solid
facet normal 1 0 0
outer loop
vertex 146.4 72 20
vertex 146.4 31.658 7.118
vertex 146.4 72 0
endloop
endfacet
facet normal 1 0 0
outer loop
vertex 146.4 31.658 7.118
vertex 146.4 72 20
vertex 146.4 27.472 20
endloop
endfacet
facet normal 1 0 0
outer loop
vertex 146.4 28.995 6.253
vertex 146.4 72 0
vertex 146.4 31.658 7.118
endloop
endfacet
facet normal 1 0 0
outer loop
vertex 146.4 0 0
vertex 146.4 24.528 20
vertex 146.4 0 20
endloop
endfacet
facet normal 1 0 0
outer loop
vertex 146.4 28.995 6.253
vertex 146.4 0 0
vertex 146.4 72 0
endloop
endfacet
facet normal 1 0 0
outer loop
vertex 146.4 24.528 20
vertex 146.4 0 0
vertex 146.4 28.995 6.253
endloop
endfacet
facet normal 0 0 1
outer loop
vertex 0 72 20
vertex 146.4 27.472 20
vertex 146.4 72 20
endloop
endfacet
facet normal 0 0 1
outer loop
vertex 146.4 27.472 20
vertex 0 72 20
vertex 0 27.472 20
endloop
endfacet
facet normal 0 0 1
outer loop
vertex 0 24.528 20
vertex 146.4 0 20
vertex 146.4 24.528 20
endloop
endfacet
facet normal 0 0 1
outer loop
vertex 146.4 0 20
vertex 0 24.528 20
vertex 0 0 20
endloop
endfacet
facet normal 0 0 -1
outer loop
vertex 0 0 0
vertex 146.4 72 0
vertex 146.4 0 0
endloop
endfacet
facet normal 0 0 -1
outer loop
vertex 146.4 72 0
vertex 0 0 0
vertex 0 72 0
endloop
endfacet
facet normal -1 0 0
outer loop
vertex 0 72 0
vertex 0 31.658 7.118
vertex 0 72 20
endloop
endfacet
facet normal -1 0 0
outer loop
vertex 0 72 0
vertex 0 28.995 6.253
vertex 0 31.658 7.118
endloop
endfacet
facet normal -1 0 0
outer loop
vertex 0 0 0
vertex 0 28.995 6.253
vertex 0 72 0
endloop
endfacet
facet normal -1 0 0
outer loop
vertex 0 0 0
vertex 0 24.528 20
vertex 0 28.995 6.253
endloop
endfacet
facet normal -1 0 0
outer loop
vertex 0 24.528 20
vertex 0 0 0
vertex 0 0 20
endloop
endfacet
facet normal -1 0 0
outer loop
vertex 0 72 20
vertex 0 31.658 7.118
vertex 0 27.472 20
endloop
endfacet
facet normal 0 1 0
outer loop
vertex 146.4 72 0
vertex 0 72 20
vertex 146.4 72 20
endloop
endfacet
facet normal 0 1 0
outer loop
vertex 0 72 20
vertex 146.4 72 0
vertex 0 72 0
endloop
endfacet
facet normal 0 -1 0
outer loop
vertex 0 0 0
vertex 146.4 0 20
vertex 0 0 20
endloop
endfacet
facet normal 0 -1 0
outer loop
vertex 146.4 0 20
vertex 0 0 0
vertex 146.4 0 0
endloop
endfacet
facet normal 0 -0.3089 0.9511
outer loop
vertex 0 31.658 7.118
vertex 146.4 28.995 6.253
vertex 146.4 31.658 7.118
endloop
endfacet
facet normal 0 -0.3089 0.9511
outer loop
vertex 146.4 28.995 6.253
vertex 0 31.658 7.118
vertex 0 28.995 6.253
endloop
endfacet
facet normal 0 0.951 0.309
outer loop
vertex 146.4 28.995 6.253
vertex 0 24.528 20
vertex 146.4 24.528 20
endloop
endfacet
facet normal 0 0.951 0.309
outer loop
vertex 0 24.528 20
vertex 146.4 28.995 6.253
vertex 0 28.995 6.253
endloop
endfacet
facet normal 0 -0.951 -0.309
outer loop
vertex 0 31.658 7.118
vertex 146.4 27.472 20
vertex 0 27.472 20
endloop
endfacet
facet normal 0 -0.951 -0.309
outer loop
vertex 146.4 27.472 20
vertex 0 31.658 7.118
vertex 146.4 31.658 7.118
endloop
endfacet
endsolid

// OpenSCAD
// file: qr_data.scad
// AUTO-GENERATED by tools/qrgen.py — DO NOT EDIT BY HAND.
// Regenerate: tools/qrgen.py --out donation-qr-stand/qr_data.scad --error q venmo=https://venmo.com/u/IamMrCupp cashapp=https://cash.app/$IamMrCupp
// QR error-correction level: Q. 1 = dark, row 0 = top.

// venmo: https://venmo.com/u/IamMrCupp  (29x29)
venmo_qr = [
  [1,1,1,1,1,1,1,0,0,0,0,1,0,1,1,0,1,1,0,0,0,0,1,1,1,1,1,1,1],
  [1,0,0,0,0,0,1,0,0,1,0,0,0,1,1,0,0,1,0,1,0,0,1,0,0,0,0,0,1],
  [1,0,1,1,1,0,1,0,1,0,1,0,1,0,0,1,1,1,0,0,1,0,1,0,1,1,1,0,1],
  [1,0,1,1,1,0,1,0,0,1,0,0,0,1,0,1,1,0,1,0,0,0,1,0,1,1,1,0,1],
  [1,0,1,1,1,0,1,0,1,1,1,0,0,1,1,1,0,0,1,0,0,0,1,0,1,1,1,0,1],
  [1,0,0,0,0,0,1,0,1,0,0,0,1,1,1,1,0,0,1,1,0,0,1,0,0,0,0,0,1],
  [1,1,1,1,1,1,1,0,1,0,1,0,1,0,1,0,1,0,1,0,1,0,1,1,1,1,1,1,1],
  [0,0,0,0,0,0,0,0,0,1,0,0,1,0,0,1,0,1,0,0,1,0,0,0,0,0,0,0,0],
  [0,1,0,0,1,0,1,0,1,1,0,1,1,0,0,0,0,1,0,1,0,1,0,1,1,0,1,0,0],
  [0,1,0,1,0,1,0,0,0,1,0,1,1,1,1,1,0,1,0,0,0,0,1,1,1,0,0,1,1],
  [0,1,1,1,1,1,1,0,0,1,0,1,0,0,1,1,1,1,1,0,1,1,0,0,0,1,1,0,1],
  [0,1,0,1,0,1,0,1,0,0,0,0,1,1,1,0,0,1,1,1,0,1,0,1,0,1,0,1,1],
  [0,0,0,1,0,1,1,1,0,0,0,0,1,0,0,1,1,1,0,1,1,0,0,1,0,0,0,0,1],
  [0,0,1,0,0,1,0,1,1,0,1,1,0,1,1,1,0,0,1,0,0,0,1,0,1,0,1,0,1],
  [0,0,0,1,1,0,1,0,0,0,0,1,0,1,0,1,0,1,0,0,0,0,0,0,1,0,0,1,1],
  [0,0,0,1,1,0,0,1,0,1,1,0,1,1,0,1,1,1,0,1,1,0,1,1,0,1,0,0,1],
  [1,1,1,1,0,1,1,1,1,1,0,1,0,1,0,0,1,0,1,1,1,1,0,0,0,0,0,1,1],
  [1,0,1,1,0,0,0,0,1,1,0,0,1,0,1,0,0,1,1,1,0,0,0,1,1,0,1,0,1],
  [0,0,1,0,0,1,1,0,0,0,1,1,0,0,0,1,0,0,1,0,0,0,0,0,0,1,0,0,1],
  [0,0,0,1,1,0,0,1,0,1,0,1,1,1,0,1,1,1,1,1,0,0,0,1,1,0,0,0,1],
  [1,1,1,0,1,1,1,1,0,0,1,1,0,1,0,0,0,1,1,1,1,1,1,1,1,1,0,1,1],
  [0,0,0,0,0,0,0,0,1,1,0,0,1,1,1,1,1,0,1,0,1,0,0,0,1,0,1,0,1],
  [1,1,1,1,1,1,1,0,0,0,1,0,1,0,1,1,0,1,0,1,1,0,1,0,1,0,0,0,1],
  [1,0,0,0,0,0,1,0,0,0,0,1,0,0,0,0,1,1,0,1,1,0,0,0,1,1,0,0,0],
  [1,0,1,1,1,0,1,0,1,0,0,0,0,1,1,0,0,0,1,1,1,1,1,1,1,0,0,1,1],
  [1,0,1,1,1,0,1,0,0,0,0,1,1,0,0,0,1,1,1,0,0,0,0,1,0,0,0,1,0],
  [1,0,1,1,1,0,1,0,0,0,0,0,1,0,1,0,1,0,1,1,1,1,0,0,0,1,1,1,1],
  [1,0,0,0,0,0,1,0,1,0,1,1,0,0,1,0,0,1,0,1,1,0,0,1,0,1,0,1,1],
  [1,1,1,1,1,1,1,0,0,1,1,1,1,1,1,1,0,1,0,0,1,1,0,0,1,1,1,1,0]
];

// cashapp: https://cash.app/$IamMrCupp  (29x29)
cashapp_qr = [
  [1,1,1,1,1,1,1,0,0,1,1,0,1,0,0,1,1,0,1,0,0,0,1,1,1,1,1,1,1],
  [1,0,0,0,0,0,1,0,1,1,1,1,1,0,0,0,1,0,0,0,1,0,1,0,0,0,0,0,1],
  [1,0,1,1,1,0,1,0,1,0,1,0,0,1,1,1,1,0,1,1,0,0,1,0,1,1,1,0,1],
  [1,0,1,1,1,0,1,0,0,0,0,1,1,0,1,1,1,1,0,0,1,0,1,0,1,1,1,0,1],
  [1,0,1,1,1,0,1,0,0,0,1,0,0,0,1,0,0,1,0,1,0,0,1,0,1,1,1,0,1],
  [1,0,0,0,0,0,1,0,0,0,1,1,1,1,1,1,0,0,0,1,1,0,1,0,0,0,0,0,1],
  [1,1,1,1,1,1,1,0,1,0,1,0,1,0,1,0,1,0,1,0,1,0,1,1,1,1,1,1,1],
  [0,0,0,0,0,0,0,0,0,1,1,1,1,1,0,1,1,1,0,0,1,0,0,0,0,0,0,0,0],
  [0,1,1,1,0,1,1,0,0,0,0,1,0,0,0,0,1,0,0,1,1,0,0,0,0,0,1,1,0],
  [0,0,0,1,0,1,0,1,0,1,1,0,1,1,0,1,1,1,1,1,1,0,1,1,1,1,0,0,1],
  [0,0,1,0,1,0,1,1,1,1,1,1,0,0,1,1,0,1,0,0,1,0,1,0,0,0,1,1,0],
  [1,0,1,1,0,0,0,1,1,1,1,1,0,0,1,1,1,0,0,1,0,0,0,1,1,0,0,0,1],
  [1,0,0,0,1,0,1,0,0,1,0,1,1,0,1,0,1,1,1,0,0,1,0,1,0,0,0,1,1],
  [0,0,0,0,0,1,0,1,1,1,1,1,1,1,0,1,0,0,0,1,0,0,1,1,0,1,1,0,1],
  [0,0,1,1,1,0,1,0,1,0,1,1,1,1,0,1,1,1,1,1,1,0,1,1,1,1,0,0,1],
  [0,1,1,0,0,0,0,0,0,1,0,0,0,1,1,1,0,1,1,1,0,1,1,0,1,1,0,0,1],
  [1,0,0,0,0,1,1,0,1,1,0,1,1,0,1,0,1,1,1,0,0,1,0,1,0,1,0,1,1],
  [0,1,1,0,0,0,0,1,1,1,1,1,1,1,1,0,1,1,0,0,1,0,1,1,0,1,1,0,0],
  [1,0,0,0,1,1,1,0,0,0,0,1,1,0,1,1,1,1,0,0,1,0,1,1,1,1,0,0,0],
  [0,0,1,1,1,0,0,0,0,0,0,0,1,1,1,0,0,1,0,0,0,1,1,0,1,1,1,1,1],
  [0,1,0,1,1,1,1,1,1,1,1,0,1,0,0,0,0,1,1,1,1,1,1,1,1,1,1,0,0],
  [0,0,0,0,0,0,0,0,1,0,1,0,0,0,1,0,1,0,1,0,1,0,0,0,1,1,0,1,1],
  [1,1,1,1,1,1,1,0,0,1,1,0,0,0,0,0,0,1,0,1,1,0,1,0,1,0,1,0,0],
  [1,0,0,0,0,0,1,0,1,1,1,0,0,0,1,0,1,0,1,0,1,0,0,0,1,0,0,0,1],
  [1,0,1,1,1,0,1,0,0,0,0,0,1,0,1,1,0,0,1,0,1,1,1,1,1,1,1,1,0],
  [1,0,1,1,1,0,1,0,1,0,0,0,1,1,0,0,1,1,1,1,0,0,0,0,1,0,1,1,0],
  [1,0,1,1,1,0,1,0,1,0,0,1,1,0,1,1,1,0,0,0,1,0,0,1,0,0,0,0,1],
  [1,0,0,0,0,0,1,0,1,1,0,1,1,1,1,0,1,0,0,1,1,1,0,0,1,1,0,1,0],
  [1,1,1,1,1,1,1,0,0,0,1,1,0,0,1,1,1,0,1,1,1,1,1,1,0,0,0,1,0]
];
// file: donation_qr_stand_common.scad
// donation_qr_stand_common.scad — dual-QR donation stand (Venmo + CashApp).
//
// A flat faceplate carries two QR codes side-by-side as a TWO-COLOR flat inset:
// the dark modules + labels are recessed pockets in the light faceplate, filled
// flush by a matching dark inlay. On a multi-toolhead printer (Snapmaker U1) you
// load both parts at the same origin and assign a colour to each — the inlay
// drops into the body's pockets and tops out flush with the light background.
// A separate easel holds the faceplate upright for scanning.
//
//   faceplate_body()   — light part: plate + recessed module/label pockets
//   faceplate_codes()  — dark part: QR modules + labels (fills the pockets)
//   easel()            — angled trough base the faceplate slots into
//
// QR matrices live in qr_data.scad (1 = dark module, row 0 = top), generated by
// tools/qrgen.py. Codes: 29x29 (v3), error-correction level Q (~25% redundancy).
//
// All three parts print FLAT and support-free. Printing the QR face flat (not as
// part of the angled wedge) gives the cleanest colour separation and scan face.

include <qr_data.scad>

// ---- QR / inlay parameters ----
MODULE_MM = 1.6;   // printed size of one QR cell (bigger = easier scan, larger plate)
QUIET     = 4;     // quiet-zone modules around each code (spec minimum is 4)
INLAY_T   = 0.8;   // dark inlay depth = pocket depth (>= a few layers)
PLATE_T   = 2.4;   // faceplate thickness
FUSE      = 0.02;  // module over-size so touching cells fuse (kills point-contacts)

// ---- faceplate layout ----
FRAME      = 8;    // outer margin around the artwork
COL_GAP    = 12;   // gap between the two codes
LABEL_GAP  = 5;    // gap below a code to its label
HEADER_GAP = 7;    // gap above the codes to the sub-headline
TITLE_H    = 7.5;  // title cap height (top line) — sized so "DONATIONS ACCEPTED" fits the frame
SUBHEAD_H  = 6;    // sub-headline cap height (second line)
LINE_GAP   = 3;    // gap between the two header lines
LABEL_H    = 7;    // label text cap height
CORNER_R   = 5;    // faceplate corner radius
LABELS     = true; // emboss header + per-code labels
TEXT_FONT  = "Liberation Sans:style=Bold";
TITLE_TXT   = "DONATIONS ACCEPTED";  // top line (what it is)
SUBHEAD_TXT = "SCAN TO DONATE";      // second line (what to do)
LABEL_L     = "VENMO";
LABEL_R     = "CASH APP";

// ---- easel ----
EASEL_D   = 72;   // base depth, front-back (stability)
EASEL_H   = 20;   // base height
SLOT_CLR  = 0.4;  // slot width clearance over plate thickness
SLOT_DEPTH= 14;   // how deep the plate sits into the slot
SEAT_H    = SLOT_DEPTH + 6;  // blank strip at the plate bottom that seats into the
                             // easel — keeps the labels above the easel lip
SLOT_Y    = 26;   // slot centre from the front edge (keeps lean-back over the base)
LEAN      = 18;   // plate lean-back from vertical (deg) -> 72 deg from horizontal

EPS = 0.01;
$fn = 48;

// ---- derived ----
function qr_n(m) = len(m);
TILE = (qr_n(venmo_qr) + 2 * QUIET) * MODULE_MM;     // both codes are the same size
PW   = 2 * TILE + COL_GAP + 2 * FRAME;               // plate width
PH   = SEAT_H + LABEL_H + LABEL_GAP + TILE + HEADER_GAP + SUBHEAD_H + LINE_GAP + TITLE_H + FRAME; // plate height
TY   = SEAT_H + LABEL_H + LABEL_GAP;                 // bottom Y of the code tiles
TX_L = FRAME;                                        // left tile X
TX_R = FRAME + TILE + COL_GAP;                       // right tile X

// 2D union of the dark cells of one code, tile bottom-left at (tx,ty).
// Cell (r,c): col -> +X, row 0 -> top (+Y). Viewed from +Z this matches a
// screen render of the matrix, so it scans un-mirrored.
module qr_squares(m, tx, ty) {
    n = qr_n(m);
    for (r = [0:n - 1])
        for (c = [0:n - 1])
            if (m[r][c] == 1)
                translate([tx + (QUIET + c + 0.5) * MODULE_MM,
                           ty + (QUIET + (n - 1 - r) + 0.5) * MODULE_MM])
                    square(MODULE_MM + FUSE, center = true);
}

// Full 2D artwork (both codes + optional text) in faceplate coordinates.
module qr_art_2d() {
    qr_squares(venmo_qr,   TX_L, TY);
    qr_squares(cashapp_qr, TX_R, TY);
    if (LABELS) {
        translate([TX_L + TILE / 2, SEAT_H + LABEL_H / 2])
            text(LABEL_L, size = LABEL_H, halign = "center", valign = "center", font = TEXT_FONT);
        translate([TX_R + TILE / 2, SEAT_H + LABEL_H / 2])
            text(LABEL_R, size = LABEL_H, halign = "center", valign = "center", font = TEXT_FONT);
        translate([PW / 2, PH - FRAME - TITLE_H / 2])
            text(TITLE_TXT, size = TITLE_H, halign = "center", valign = "center", font = TEXT_FONT);
        translate([PW / 2, PH - FRAME - TITLE_H - LINE_GAP - SUBHEAD_H / 2])
            text(SUBHEAD_TXT, size = SUBHEAD_H, halign = "center", valign = "center", font = TEXT_FONT);
    }
}

module rounded_rect(w, h, r) {
    hull() for (x = [r, w - r]) for (y = [r, h - r]) translate([x, y]) circle(r = r);
}

// ---- parts ----

// Light faceplate: solid plate with the artwork recessed into the top face.
module faceplate_body() {
    difference() {
        linear_extrude(PLATE_T) rounded_rect(PW, PH, CORNER_R);
        translate([0, 0, PLATE_T - INLAY_T])
            linear_extrude(INLAY_T + EPS) qr_art_2d();
    }
}

// Dark inlay: the artwork as thin tiles that fill the body pockets flush.
module faceplate_codes() {
    translate([0, 0, PLATE_T - INLAY_T])
        linear_extrude(INLAY_T) qr_art_2d();
}

// Angled trough base. Centred on the plate width so body + easel share an X axis.
module easel() {
    slot_w = PLATE_T + SLOT_CLR;
    translate([0, 0, 0])
    difference() {
        // base block, centred in X under the faceplate
        translate([-(PW - PW) / 2, 0, 0]) cube([PW, EASEL_D, EASEL_H]);
        // angled slot, open at the top, leaning back by LEAN
        translate([PW / 2, SLOT_Y, EASEL_H])
            rotate([LEAN, 0, 0])
                translate([-(PW + 2) / 2, -slot_w / 2, -SLOT_DEPTH])
                    cube([PW + 2, slot_w, SLOT_DEPTH + 30]);
    }
}
// main file
// donation_qr_stand_easel — angled trough base that holds the faceplate upright.
// Print FLAT (base on the bed); the faceplate slots into the angled groove.
include <donation_qr_stand_common.scad>
easel();
